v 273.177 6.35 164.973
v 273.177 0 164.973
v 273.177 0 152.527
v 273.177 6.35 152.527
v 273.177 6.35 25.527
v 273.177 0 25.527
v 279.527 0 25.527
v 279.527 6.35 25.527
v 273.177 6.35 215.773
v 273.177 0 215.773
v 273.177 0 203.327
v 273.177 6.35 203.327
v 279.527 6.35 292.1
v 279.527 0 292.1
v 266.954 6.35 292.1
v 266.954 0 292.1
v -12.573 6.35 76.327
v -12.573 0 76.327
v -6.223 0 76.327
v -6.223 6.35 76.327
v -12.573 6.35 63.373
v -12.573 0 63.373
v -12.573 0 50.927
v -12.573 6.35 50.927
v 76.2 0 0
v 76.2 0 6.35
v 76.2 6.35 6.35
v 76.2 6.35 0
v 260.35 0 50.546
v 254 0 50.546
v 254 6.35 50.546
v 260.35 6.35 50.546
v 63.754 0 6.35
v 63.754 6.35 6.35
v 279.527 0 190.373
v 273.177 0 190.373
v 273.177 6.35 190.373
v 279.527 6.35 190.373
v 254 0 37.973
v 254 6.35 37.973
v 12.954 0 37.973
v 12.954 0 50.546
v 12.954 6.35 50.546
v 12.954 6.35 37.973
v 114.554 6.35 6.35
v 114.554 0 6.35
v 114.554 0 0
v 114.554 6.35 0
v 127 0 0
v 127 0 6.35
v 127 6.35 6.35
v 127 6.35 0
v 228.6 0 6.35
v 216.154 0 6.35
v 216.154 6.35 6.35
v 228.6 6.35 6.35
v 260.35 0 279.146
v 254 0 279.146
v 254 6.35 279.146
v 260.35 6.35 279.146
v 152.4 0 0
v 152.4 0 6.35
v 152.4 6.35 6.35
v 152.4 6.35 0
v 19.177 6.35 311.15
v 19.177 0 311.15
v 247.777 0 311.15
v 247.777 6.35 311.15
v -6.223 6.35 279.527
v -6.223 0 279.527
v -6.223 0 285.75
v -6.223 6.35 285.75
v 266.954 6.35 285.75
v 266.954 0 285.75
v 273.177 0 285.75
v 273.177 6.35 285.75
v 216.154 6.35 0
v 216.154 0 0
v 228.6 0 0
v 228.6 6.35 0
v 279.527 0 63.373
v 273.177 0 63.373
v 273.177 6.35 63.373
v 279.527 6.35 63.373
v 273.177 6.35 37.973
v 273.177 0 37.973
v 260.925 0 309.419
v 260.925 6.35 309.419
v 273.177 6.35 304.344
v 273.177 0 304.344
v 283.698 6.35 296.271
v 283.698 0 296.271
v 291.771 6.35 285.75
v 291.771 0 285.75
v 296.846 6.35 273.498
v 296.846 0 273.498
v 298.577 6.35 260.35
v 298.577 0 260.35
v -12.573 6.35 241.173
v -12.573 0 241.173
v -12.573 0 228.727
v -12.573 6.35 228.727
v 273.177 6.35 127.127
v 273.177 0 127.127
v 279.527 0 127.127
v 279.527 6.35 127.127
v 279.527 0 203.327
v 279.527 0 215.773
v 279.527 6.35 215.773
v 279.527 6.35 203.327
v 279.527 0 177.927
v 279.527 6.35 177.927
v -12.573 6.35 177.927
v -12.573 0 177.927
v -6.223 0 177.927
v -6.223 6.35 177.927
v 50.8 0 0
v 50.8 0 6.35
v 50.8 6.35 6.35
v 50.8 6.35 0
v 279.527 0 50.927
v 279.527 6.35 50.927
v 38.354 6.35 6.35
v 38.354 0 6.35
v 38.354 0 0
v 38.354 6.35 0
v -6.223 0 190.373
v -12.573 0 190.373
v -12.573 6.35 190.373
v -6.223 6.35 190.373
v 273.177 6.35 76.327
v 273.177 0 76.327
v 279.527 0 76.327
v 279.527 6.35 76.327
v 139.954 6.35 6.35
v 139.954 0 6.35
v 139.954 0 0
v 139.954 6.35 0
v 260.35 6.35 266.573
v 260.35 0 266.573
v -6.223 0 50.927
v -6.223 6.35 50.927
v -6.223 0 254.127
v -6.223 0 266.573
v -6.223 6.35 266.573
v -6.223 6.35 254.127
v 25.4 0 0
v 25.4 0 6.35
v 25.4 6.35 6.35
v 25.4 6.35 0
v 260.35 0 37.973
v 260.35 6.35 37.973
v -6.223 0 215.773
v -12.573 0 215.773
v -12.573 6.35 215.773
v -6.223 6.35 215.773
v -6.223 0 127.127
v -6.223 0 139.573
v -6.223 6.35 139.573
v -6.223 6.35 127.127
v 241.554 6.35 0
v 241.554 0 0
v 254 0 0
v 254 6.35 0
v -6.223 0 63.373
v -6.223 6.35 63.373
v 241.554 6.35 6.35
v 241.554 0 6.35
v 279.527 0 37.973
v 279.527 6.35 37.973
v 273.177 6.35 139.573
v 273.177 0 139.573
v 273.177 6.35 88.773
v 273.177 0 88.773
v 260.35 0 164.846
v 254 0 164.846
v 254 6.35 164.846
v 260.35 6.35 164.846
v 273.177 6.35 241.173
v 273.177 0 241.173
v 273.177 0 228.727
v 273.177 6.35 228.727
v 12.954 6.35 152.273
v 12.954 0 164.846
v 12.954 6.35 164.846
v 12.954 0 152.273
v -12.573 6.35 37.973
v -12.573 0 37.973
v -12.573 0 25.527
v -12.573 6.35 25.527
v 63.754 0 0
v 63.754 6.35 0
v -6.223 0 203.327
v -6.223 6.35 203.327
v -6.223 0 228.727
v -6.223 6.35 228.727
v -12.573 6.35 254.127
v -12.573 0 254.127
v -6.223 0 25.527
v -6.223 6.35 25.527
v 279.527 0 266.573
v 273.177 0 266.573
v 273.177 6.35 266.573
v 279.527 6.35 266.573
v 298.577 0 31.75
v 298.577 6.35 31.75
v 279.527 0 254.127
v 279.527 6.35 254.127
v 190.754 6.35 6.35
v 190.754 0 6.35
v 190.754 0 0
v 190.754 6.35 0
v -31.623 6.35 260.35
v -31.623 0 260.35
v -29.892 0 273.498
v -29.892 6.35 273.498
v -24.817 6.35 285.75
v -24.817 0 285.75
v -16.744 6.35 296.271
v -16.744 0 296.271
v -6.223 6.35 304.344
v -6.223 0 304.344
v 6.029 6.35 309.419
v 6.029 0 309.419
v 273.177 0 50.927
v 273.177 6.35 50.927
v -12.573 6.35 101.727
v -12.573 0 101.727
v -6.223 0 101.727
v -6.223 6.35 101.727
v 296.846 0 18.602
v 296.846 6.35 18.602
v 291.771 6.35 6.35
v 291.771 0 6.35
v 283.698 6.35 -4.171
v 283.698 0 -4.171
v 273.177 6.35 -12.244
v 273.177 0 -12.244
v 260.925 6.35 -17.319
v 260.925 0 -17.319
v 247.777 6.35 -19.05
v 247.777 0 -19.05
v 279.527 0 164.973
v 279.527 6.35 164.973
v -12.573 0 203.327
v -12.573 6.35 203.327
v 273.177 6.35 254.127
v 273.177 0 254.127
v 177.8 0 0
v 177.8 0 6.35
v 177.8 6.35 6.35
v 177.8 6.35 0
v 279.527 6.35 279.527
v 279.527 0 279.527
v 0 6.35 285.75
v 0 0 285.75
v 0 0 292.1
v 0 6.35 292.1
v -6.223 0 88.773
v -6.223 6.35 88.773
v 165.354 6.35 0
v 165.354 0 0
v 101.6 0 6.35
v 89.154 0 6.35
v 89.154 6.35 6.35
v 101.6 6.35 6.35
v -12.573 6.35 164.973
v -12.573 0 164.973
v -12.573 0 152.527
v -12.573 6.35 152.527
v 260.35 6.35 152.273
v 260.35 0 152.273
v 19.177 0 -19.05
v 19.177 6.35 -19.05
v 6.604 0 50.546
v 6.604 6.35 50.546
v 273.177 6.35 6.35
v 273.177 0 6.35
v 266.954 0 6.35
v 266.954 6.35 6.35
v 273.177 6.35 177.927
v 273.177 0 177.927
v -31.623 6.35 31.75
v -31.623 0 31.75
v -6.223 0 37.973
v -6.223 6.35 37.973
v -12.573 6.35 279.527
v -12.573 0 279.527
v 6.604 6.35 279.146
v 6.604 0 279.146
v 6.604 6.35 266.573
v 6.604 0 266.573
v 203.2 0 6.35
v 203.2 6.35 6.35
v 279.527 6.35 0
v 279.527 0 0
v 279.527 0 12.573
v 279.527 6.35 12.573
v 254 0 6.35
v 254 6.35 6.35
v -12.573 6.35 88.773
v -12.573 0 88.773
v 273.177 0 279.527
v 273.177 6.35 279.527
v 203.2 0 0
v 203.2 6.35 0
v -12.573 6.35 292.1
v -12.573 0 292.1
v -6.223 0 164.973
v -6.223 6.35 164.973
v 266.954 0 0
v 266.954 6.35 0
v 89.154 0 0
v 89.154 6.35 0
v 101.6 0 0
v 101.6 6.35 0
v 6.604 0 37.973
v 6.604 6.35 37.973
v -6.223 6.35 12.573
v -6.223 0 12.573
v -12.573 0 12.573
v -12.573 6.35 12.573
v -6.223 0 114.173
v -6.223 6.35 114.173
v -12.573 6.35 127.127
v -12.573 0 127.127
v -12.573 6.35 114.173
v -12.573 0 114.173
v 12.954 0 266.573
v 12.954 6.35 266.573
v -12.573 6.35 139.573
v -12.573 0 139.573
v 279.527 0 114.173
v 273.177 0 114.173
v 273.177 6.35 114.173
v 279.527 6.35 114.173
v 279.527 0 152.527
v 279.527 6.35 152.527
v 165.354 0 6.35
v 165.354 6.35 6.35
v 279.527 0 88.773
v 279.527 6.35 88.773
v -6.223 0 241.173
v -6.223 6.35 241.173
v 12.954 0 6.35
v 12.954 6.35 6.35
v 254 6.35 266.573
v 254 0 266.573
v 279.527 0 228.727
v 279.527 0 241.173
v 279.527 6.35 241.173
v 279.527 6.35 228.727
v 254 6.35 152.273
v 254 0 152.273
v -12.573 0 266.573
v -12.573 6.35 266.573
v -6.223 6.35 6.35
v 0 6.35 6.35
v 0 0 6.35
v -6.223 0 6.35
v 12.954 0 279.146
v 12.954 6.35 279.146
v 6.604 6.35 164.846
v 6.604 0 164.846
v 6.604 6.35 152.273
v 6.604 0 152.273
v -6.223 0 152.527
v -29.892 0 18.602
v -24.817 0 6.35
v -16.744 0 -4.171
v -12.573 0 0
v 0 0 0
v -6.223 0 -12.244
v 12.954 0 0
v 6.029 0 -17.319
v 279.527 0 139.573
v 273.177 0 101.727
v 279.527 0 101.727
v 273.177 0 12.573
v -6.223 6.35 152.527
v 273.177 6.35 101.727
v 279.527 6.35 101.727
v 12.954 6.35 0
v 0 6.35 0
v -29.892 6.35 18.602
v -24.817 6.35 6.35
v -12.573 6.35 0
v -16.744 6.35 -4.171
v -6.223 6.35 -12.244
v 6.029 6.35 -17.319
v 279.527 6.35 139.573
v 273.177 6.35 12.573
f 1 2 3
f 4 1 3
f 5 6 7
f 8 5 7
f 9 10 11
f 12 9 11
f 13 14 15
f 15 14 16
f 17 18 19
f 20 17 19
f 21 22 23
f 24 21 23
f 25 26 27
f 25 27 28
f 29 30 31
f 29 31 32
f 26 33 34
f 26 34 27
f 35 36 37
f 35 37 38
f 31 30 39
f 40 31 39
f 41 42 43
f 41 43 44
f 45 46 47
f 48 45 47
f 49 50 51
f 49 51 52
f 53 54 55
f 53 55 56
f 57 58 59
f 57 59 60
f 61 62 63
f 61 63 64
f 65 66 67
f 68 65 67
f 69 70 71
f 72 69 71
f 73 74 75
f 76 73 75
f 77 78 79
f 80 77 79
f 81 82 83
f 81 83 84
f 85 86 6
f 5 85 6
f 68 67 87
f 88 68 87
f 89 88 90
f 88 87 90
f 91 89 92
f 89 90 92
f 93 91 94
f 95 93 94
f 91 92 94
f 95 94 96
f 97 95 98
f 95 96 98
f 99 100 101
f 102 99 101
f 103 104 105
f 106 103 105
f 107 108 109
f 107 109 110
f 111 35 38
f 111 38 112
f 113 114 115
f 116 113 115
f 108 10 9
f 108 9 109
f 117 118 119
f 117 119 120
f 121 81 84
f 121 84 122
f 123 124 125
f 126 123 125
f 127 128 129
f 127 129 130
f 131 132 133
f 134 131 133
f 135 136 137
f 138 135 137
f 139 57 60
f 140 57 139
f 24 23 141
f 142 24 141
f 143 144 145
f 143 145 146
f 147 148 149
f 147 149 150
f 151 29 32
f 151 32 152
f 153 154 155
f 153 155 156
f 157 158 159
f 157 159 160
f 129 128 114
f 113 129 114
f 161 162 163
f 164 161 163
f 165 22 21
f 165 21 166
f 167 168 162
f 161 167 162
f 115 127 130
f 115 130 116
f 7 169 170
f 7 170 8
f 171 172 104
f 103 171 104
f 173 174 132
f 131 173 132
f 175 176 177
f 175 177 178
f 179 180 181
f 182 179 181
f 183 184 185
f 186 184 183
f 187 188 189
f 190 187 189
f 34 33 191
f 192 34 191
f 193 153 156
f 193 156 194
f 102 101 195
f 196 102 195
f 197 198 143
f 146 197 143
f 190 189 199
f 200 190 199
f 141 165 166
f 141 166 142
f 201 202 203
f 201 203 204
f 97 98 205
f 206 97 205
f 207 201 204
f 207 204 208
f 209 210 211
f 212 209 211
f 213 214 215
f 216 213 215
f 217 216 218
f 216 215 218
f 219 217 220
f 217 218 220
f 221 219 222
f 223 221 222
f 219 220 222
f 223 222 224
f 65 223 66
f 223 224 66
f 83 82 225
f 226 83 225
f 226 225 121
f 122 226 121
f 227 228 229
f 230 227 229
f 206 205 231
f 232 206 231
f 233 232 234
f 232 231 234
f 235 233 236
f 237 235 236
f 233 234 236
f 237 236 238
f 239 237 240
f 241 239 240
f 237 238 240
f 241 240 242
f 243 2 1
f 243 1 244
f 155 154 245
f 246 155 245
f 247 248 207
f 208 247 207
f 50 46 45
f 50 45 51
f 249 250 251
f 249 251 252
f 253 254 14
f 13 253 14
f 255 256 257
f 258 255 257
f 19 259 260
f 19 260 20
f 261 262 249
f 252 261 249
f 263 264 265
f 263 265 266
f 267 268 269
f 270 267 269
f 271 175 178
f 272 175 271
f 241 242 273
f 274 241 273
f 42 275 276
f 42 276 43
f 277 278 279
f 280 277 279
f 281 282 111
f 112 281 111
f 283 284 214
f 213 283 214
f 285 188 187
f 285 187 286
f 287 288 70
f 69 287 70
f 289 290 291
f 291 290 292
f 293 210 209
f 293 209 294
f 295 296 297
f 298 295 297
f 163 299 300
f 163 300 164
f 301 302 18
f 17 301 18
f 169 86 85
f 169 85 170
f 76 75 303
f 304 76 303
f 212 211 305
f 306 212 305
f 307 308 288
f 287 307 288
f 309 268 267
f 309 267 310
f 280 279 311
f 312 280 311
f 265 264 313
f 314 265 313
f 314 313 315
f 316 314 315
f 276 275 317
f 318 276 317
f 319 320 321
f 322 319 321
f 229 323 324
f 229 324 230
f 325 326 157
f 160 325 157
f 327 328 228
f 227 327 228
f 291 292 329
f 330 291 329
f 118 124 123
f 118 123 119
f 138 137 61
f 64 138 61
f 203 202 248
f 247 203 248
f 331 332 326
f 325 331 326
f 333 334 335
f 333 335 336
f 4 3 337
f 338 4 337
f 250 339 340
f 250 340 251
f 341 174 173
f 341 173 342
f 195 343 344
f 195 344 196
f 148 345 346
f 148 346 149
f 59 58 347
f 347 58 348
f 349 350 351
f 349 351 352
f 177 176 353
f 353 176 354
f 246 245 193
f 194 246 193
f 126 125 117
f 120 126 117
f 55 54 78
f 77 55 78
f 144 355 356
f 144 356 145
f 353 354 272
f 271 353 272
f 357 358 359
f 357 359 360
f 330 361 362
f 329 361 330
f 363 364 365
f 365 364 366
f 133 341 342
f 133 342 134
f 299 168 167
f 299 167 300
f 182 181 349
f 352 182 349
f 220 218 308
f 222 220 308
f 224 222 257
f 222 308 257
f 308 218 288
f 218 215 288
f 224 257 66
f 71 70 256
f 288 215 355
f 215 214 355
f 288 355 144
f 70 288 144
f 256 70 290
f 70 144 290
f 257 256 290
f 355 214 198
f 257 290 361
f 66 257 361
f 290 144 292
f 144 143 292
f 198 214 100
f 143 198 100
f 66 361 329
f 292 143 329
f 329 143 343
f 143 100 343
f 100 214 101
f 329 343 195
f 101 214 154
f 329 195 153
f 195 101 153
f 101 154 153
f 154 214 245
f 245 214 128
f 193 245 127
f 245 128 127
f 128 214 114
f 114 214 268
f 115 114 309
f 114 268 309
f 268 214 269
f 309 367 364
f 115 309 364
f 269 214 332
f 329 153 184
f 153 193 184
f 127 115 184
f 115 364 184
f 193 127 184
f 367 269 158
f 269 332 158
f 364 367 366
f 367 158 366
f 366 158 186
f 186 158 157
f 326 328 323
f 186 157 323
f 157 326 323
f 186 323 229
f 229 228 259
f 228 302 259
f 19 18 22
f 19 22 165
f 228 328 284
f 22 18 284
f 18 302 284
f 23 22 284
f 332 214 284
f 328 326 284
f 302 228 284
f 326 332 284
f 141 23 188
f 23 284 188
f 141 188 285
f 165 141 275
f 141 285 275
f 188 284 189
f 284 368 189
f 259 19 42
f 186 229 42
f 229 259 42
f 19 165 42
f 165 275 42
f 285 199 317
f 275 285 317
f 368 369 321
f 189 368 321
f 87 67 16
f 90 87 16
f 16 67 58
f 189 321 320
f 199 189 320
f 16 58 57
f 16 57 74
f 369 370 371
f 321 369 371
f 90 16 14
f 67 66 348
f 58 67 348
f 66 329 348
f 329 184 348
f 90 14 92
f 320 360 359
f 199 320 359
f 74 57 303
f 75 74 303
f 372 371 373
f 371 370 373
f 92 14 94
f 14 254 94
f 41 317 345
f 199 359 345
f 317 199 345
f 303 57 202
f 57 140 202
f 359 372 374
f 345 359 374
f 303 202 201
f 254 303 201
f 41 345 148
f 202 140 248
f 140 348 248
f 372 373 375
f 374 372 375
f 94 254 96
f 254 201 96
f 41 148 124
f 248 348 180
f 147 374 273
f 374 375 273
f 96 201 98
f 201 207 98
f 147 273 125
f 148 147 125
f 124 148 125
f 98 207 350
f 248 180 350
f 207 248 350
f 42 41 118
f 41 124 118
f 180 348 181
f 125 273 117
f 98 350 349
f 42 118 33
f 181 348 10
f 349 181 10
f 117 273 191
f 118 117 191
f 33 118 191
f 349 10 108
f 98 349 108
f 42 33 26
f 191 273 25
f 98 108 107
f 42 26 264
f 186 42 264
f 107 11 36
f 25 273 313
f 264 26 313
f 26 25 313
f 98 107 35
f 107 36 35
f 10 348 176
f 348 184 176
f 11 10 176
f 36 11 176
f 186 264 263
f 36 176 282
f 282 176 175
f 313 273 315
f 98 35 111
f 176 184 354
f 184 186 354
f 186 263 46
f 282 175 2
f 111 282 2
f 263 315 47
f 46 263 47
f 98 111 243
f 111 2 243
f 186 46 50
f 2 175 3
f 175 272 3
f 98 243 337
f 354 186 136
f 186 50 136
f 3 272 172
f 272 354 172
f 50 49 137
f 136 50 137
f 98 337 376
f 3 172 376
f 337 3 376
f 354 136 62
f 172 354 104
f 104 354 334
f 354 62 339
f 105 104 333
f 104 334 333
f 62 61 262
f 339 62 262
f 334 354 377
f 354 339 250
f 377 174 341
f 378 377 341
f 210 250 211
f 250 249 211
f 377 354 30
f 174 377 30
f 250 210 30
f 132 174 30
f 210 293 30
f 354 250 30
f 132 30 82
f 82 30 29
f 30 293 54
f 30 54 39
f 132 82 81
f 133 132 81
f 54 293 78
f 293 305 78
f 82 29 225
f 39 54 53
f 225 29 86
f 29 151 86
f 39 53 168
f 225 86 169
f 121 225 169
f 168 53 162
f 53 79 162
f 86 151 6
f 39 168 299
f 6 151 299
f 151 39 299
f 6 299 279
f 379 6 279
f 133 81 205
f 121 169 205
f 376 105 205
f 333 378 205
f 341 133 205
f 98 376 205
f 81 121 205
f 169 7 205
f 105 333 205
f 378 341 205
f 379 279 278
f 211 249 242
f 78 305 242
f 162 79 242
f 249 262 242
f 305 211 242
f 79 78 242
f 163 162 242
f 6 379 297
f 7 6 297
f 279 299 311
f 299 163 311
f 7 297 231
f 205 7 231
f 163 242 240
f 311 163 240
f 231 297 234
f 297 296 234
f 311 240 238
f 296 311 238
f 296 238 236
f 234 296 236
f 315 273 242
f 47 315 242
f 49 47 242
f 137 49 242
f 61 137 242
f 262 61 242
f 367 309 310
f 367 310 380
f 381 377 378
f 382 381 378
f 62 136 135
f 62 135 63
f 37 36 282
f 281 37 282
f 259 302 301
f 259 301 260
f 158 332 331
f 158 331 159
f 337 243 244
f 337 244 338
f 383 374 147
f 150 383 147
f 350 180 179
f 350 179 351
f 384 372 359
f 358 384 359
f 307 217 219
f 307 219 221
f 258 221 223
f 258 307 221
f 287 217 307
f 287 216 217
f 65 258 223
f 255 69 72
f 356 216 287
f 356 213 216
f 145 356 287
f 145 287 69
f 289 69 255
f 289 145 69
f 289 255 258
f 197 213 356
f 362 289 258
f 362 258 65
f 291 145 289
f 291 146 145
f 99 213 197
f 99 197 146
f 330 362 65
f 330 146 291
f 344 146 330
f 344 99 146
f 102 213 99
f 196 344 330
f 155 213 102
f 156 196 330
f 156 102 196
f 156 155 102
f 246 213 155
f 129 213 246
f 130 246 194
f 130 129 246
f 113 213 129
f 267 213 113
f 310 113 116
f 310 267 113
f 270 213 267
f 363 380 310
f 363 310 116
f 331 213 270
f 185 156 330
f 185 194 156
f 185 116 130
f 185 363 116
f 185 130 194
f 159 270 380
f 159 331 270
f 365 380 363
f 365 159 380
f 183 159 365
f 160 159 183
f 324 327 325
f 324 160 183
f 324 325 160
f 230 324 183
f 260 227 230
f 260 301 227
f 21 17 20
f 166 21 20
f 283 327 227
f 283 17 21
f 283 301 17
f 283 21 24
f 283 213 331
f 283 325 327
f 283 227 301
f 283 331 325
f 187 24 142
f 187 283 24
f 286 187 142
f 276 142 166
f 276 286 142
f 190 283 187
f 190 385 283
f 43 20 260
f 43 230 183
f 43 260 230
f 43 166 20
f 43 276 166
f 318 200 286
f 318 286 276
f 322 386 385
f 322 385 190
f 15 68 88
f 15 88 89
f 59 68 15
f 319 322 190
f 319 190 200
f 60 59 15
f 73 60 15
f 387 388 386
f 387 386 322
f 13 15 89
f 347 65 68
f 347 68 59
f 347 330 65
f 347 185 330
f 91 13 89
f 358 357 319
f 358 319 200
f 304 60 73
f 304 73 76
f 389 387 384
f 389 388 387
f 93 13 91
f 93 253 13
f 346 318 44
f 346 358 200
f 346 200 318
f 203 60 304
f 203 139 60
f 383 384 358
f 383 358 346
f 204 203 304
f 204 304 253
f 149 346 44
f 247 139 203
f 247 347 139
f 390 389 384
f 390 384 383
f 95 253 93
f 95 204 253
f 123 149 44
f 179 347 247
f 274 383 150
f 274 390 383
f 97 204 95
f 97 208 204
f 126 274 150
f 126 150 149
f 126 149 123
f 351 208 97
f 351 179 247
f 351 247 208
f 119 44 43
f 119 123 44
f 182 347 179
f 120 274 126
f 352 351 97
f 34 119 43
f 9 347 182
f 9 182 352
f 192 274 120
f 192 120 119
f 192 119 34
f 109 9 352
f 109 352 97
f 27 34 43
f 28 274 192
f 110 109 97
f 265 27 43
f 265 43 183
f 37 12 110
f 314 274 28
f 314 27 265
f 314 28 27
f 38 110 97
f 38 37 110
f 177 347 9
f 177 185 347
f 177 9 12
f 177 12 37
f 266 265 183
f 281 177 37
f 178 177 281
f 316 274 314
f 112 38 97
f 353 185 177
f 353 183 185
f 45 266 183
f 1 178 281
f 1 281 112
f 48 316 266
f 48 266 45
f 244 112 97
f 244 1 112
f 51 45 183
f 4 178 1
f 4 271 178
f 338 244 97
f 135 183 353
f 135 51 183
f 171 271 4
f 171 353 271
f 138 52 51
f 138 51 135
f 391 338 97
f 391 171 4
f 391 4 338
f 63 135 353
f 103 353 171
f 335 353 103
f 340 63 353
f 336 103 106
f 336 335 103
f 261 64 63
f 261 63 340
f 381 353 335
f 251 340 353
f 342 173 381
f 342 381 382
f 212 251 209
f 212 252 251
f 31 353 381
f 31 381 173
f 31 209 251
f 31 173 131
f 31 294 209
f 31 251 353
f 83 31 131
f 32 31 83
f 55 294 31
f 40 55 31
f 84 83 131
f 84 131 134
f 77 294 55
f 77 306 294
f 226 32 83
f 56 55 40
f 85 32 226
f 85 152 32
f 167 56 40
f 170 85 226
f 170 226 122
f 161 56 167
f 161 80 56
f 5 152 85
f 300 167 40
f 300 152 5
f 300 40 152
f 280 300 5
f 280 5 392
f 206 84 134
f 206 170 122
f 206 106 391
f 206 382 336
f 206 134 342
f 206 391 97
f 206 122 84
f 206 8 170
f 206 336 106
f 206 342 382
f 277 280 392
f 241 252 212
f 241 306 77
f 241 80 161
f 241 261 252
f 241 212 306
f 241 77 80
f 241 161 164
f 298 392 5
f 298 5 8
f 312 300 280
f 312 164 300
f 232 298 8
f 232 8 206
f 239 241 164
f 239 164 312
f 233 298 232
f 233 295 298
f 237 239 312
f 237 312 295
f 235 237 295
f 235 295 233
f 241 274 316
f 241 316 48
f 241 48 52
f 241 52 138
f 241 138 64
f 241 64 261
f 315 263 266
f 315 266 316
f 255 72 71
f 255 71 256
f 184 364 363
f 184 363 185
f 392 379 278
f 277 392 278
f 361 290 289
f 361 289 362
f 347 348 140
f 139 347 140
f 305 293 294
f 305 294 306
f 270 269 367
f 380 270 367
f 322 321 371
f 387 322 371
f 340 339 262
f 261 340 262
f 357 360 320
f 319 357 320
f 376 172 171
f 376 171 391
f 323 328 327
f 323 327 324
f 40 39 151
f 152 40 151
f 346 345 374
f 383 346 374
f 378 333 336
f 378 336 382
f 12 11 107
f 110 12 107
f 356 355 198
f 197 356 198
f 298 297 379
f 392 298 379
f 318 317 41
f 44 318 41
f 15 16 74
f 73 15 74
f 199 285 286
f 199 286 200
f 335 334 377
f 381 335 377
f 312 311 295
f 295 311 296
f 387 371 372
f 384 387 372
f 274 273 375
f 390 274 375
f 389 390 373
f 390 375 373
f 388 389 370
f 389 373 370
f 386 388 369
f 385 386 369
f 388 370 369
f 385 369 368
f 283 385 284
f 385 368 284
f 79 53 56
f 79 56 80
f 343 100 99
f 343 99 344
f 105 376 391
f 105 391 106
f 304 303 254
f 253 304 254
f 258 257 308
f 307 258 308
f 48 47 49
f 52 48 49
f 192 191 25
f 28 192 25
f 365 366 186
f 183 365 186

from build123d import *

# Parameters (mm, degrees)
SKETCH1_W           = 6.35
SKETCH1_H           = 12.446
SKETCH1_W_2         = 12.446
SKETCH1_H_2         = 6.35
SKETCH1_H_3         = 12.573
BOSS_EXTRUDE1_DEPTH = 6.35


with BuildPart() as part:
    # Sketch1 → Boss-Extrude1 (new body)
    with BuildSketch(Plane(origin=(0, 0, 0), x_dir=(1, 0, 0), z_dir=(0, 1, 0))):
        with BuildLine():
            Line((19.177, -311.15), (247.777, -311.15))
            ThreePointArc((247.777, -311.15), (283.698024484, -296.271024484), (298.577, -260.35))
            Line((298.577, -260.35), (298.577, -31.75))
            ThreePointArc((298.577, -31.75), (283.698024484, 4.171024484), (247.777, 19.05))
            Line((247.777, 19.05), (19.177, 19.05))
            ThreePointArc((19.177, 19.05), (-16.744024484, 4.171024484), (-31.623, -31.75))
            Line((-31.623, -31.75), (-31.623, -260.35))
            ThreePointArc((-31.623, -260.35), (-16.744024484, -296.271024484), (19.177, -311.15))
        make_face()
        with Locations((-9.398, -234.95)):
            Rectangle(SKETCH1_W, SKETCH1_H, mode=Mode.SUBTRACT)
        with Locations((-9.398, -209.55)):
            Rectangle(SKETCH1_W, SKETCH1_H, mode=Mode.SUBTRACT)
        with Locations((-9.398, -184.15)):
            Rectangle(SKETCH1_W, SKETCH1_H, mode=Mode.SUBTRACT)
        with Locations((-9.398, -158.75)):
            Rectangle(SKETCH1_W, SKETCH1_H, mode=Mode.SUBTRACT)
        with Locations((-9.398, -133.35)):
            Rectangle(SKETCH1_W, SKETCH1_H, mode=Mode.SUBTRACT)
        with Locations((-9.398, -107.95)):
            Rectangle(SKETCH1_W, SKETCH1_H, mode=Mode.SUBTRACT)
        with Locations((-9.398, -82.55)):
            Rectangle(SKETCH1_W, SKETCH1_H, mode=Mode.SUBTRACT)
        with Locations((-9.398, -57.15)):
            Rectangle(SKETCH1_W, SKETCH1_H, mode=Mode.SUBTRACT)
        with Locations((-9.398, -31.75)):
            Rectangle(SKETCH1_W, SKETCH1_H, mode=Mode.SUBTRACT)
        Polygon((-6.223, -12.573), (-12.573, -12.573), (-12.573, 0), (0, 0), (0, -6.35), (-6.223, -6.35), align=None, mode=Mode.SUBTRACT)
        Polygon((273.177, -285.75), (273.177, -279.527), (279.527, -279.527), (279.527, -292.1), (266.954, -292.1), (266.954, -285.75), align=None, mode=Mode.SUBTRACT)
        with Locations((276.352, -260.35)):
            Rectangle(SKETCH1_W, SKETCH1_H, mode=Mode.SUBTRACT)
        with Locations((276.352, -234.95)):
            Rectangle(SKETCH1_W, SKETCH1_H, mode=Mode.SUBTRACT)
        Polygon((-6.223, -279.527), (-6.223, -285.75), (0, -285.75), (0, -292.1), (-12.573, -292.1), (-12.573, -279.527), align=None, mode=Mode.SUBTRACT)
        with Locations((-9.398, -260.35)):
            Rectangle(SKETCH1_W, SKETCH1_H, mode=Mode.SUBTRACT)
        with Locations((276.352, -209.55)):
            Rectangle(SKETCH1_W, SKETCH1_H, mode=Mode.SUBTRACT)
        with Locations((276.352, -184.15)):
            Rectangle(SKETCH1_W, SKETCH1_H, mode=Mode.SUBTRACT)
        with Locations((276.352, -158.75)):
            Rectangle(SKETCH1_W, SKETCH1_H, mode=Mode.SUBTRACT)
        with Locations((276.352, -133.35)):
            Rectangle(SKETCH1_W, SKETCH1_H, mode=Mode.SUBTRACT)
        with Locations((276.352, -107.95)):
            Rectangle(SKETCH1_W, SKETCH1_H, mode=Mode.SUBTRACT)
        with Locations((276.352, -82.55)):
            Rectangle(SKETCH1_W, SKETCH1_H, mode=Mode.SUBTRACT)
        with Locations((276.352, -57.15)):
            Rectangle(SKETCH1_W, SKETCH1_H, mode=Mode.SUBTRACT)
        with Locations((276.352, -31.75)):
            Rectangle(SKETCH1_W, SKETCH1_H, mode=Mode.SUBTRACT)
        Polygon((279.527, -12.573), (273.177, -12.573), (273.177, -6.35), (266.954, -6.35), (266.954, 0), (279.527, 0), align=None, mode=Mode.SUBTRACT)
        with Locations((19.177, -3.175)):
            Rectangle(SKETCH1_W_2, SKETCH1_H_2, mode=Mode.SUBTRACT)
        with Locations((44.577, -3.175)):
            Rectangle(SKETCH1_W_2, SKETCH1_H_2, mode=Mode.SUBTRACT)
        with Locations((69.977, -3.175)):
            Rectangle(SKETCH1_W_2, SKETCH1_H_2, mode=Mode.SUBTRACT)
        with Locations((95.377, -3.175)):
            Rectangle(SKETCH1_W_2, SKETCH1_H_2, mode=Mode.SUBTRACT)
        with Locations((120.777, -3.175)):
            Rectangle(SKETCH1_W_2, SKETCH1_H_2, mode=Mode.SUBTRACT)
        with Locations((146.177, -3.175)):
            Rectangle(SKETCH1_W_2, SKETCH1_H_2, mode=Mode.SUBTRACT)
        with Locations((171.577, -3.175)):
            Rectangle(SKETCH1_W_2, SKETCH1_H_2, mode=Mode.SUBTRACT)
        with Locations((196.977, -3.175)):
            Rectangle(SKETCH1_W_2, SKETCH1_H_2, mode=Mode.SUBTRACT)
        with Locations((222.377, -3.175)):
            Rectangle(SKETCH1_W_2, SKETCH1_H_2, mode=Mode.SUBTRACT)
        with Locations((247.777, -3.175)):
            Rectangle(SKETCH1_W_2, SKETCH1_H_2, mode=Mode.SUBTRACT)
        with Locations((257.175, -158.5595)):
            Rectangle(SKETCH1_W, SKETCH1_H_3, mode=Mode.SUBTRACT)
        with Locations((257.175, -272.8595)):
            Rectangle(SKETCH1_W, SKETCH1_H_3, mode=Mode.SUBTRACT)
        with Locations((257.175, -44.2595)):
            Rectangle(SKETCH1_W, SKETCH1_H_3, mode=Mode.SUBTRACT)
        with Locations((9.779, -44.2595)):
            Rectangle(SKETCH1_W, SKETCH1_H_3, mode=Mode.SUBTRACT)
        with Locations((9.779, -158.5595)):
            Rectangle(SKETCH1_W, SKETCH1_H_3, mode=Mode.SUBTRACT)
        with Locations((9.779, -272.8595)):
            Rectangle(SKETCH1_W, SKETCH1_H_3, mode=Mode.SUBTRACT)
    extrude(amount=BOSS_EXTRUDE1_DEPTH)


solid = part.part
